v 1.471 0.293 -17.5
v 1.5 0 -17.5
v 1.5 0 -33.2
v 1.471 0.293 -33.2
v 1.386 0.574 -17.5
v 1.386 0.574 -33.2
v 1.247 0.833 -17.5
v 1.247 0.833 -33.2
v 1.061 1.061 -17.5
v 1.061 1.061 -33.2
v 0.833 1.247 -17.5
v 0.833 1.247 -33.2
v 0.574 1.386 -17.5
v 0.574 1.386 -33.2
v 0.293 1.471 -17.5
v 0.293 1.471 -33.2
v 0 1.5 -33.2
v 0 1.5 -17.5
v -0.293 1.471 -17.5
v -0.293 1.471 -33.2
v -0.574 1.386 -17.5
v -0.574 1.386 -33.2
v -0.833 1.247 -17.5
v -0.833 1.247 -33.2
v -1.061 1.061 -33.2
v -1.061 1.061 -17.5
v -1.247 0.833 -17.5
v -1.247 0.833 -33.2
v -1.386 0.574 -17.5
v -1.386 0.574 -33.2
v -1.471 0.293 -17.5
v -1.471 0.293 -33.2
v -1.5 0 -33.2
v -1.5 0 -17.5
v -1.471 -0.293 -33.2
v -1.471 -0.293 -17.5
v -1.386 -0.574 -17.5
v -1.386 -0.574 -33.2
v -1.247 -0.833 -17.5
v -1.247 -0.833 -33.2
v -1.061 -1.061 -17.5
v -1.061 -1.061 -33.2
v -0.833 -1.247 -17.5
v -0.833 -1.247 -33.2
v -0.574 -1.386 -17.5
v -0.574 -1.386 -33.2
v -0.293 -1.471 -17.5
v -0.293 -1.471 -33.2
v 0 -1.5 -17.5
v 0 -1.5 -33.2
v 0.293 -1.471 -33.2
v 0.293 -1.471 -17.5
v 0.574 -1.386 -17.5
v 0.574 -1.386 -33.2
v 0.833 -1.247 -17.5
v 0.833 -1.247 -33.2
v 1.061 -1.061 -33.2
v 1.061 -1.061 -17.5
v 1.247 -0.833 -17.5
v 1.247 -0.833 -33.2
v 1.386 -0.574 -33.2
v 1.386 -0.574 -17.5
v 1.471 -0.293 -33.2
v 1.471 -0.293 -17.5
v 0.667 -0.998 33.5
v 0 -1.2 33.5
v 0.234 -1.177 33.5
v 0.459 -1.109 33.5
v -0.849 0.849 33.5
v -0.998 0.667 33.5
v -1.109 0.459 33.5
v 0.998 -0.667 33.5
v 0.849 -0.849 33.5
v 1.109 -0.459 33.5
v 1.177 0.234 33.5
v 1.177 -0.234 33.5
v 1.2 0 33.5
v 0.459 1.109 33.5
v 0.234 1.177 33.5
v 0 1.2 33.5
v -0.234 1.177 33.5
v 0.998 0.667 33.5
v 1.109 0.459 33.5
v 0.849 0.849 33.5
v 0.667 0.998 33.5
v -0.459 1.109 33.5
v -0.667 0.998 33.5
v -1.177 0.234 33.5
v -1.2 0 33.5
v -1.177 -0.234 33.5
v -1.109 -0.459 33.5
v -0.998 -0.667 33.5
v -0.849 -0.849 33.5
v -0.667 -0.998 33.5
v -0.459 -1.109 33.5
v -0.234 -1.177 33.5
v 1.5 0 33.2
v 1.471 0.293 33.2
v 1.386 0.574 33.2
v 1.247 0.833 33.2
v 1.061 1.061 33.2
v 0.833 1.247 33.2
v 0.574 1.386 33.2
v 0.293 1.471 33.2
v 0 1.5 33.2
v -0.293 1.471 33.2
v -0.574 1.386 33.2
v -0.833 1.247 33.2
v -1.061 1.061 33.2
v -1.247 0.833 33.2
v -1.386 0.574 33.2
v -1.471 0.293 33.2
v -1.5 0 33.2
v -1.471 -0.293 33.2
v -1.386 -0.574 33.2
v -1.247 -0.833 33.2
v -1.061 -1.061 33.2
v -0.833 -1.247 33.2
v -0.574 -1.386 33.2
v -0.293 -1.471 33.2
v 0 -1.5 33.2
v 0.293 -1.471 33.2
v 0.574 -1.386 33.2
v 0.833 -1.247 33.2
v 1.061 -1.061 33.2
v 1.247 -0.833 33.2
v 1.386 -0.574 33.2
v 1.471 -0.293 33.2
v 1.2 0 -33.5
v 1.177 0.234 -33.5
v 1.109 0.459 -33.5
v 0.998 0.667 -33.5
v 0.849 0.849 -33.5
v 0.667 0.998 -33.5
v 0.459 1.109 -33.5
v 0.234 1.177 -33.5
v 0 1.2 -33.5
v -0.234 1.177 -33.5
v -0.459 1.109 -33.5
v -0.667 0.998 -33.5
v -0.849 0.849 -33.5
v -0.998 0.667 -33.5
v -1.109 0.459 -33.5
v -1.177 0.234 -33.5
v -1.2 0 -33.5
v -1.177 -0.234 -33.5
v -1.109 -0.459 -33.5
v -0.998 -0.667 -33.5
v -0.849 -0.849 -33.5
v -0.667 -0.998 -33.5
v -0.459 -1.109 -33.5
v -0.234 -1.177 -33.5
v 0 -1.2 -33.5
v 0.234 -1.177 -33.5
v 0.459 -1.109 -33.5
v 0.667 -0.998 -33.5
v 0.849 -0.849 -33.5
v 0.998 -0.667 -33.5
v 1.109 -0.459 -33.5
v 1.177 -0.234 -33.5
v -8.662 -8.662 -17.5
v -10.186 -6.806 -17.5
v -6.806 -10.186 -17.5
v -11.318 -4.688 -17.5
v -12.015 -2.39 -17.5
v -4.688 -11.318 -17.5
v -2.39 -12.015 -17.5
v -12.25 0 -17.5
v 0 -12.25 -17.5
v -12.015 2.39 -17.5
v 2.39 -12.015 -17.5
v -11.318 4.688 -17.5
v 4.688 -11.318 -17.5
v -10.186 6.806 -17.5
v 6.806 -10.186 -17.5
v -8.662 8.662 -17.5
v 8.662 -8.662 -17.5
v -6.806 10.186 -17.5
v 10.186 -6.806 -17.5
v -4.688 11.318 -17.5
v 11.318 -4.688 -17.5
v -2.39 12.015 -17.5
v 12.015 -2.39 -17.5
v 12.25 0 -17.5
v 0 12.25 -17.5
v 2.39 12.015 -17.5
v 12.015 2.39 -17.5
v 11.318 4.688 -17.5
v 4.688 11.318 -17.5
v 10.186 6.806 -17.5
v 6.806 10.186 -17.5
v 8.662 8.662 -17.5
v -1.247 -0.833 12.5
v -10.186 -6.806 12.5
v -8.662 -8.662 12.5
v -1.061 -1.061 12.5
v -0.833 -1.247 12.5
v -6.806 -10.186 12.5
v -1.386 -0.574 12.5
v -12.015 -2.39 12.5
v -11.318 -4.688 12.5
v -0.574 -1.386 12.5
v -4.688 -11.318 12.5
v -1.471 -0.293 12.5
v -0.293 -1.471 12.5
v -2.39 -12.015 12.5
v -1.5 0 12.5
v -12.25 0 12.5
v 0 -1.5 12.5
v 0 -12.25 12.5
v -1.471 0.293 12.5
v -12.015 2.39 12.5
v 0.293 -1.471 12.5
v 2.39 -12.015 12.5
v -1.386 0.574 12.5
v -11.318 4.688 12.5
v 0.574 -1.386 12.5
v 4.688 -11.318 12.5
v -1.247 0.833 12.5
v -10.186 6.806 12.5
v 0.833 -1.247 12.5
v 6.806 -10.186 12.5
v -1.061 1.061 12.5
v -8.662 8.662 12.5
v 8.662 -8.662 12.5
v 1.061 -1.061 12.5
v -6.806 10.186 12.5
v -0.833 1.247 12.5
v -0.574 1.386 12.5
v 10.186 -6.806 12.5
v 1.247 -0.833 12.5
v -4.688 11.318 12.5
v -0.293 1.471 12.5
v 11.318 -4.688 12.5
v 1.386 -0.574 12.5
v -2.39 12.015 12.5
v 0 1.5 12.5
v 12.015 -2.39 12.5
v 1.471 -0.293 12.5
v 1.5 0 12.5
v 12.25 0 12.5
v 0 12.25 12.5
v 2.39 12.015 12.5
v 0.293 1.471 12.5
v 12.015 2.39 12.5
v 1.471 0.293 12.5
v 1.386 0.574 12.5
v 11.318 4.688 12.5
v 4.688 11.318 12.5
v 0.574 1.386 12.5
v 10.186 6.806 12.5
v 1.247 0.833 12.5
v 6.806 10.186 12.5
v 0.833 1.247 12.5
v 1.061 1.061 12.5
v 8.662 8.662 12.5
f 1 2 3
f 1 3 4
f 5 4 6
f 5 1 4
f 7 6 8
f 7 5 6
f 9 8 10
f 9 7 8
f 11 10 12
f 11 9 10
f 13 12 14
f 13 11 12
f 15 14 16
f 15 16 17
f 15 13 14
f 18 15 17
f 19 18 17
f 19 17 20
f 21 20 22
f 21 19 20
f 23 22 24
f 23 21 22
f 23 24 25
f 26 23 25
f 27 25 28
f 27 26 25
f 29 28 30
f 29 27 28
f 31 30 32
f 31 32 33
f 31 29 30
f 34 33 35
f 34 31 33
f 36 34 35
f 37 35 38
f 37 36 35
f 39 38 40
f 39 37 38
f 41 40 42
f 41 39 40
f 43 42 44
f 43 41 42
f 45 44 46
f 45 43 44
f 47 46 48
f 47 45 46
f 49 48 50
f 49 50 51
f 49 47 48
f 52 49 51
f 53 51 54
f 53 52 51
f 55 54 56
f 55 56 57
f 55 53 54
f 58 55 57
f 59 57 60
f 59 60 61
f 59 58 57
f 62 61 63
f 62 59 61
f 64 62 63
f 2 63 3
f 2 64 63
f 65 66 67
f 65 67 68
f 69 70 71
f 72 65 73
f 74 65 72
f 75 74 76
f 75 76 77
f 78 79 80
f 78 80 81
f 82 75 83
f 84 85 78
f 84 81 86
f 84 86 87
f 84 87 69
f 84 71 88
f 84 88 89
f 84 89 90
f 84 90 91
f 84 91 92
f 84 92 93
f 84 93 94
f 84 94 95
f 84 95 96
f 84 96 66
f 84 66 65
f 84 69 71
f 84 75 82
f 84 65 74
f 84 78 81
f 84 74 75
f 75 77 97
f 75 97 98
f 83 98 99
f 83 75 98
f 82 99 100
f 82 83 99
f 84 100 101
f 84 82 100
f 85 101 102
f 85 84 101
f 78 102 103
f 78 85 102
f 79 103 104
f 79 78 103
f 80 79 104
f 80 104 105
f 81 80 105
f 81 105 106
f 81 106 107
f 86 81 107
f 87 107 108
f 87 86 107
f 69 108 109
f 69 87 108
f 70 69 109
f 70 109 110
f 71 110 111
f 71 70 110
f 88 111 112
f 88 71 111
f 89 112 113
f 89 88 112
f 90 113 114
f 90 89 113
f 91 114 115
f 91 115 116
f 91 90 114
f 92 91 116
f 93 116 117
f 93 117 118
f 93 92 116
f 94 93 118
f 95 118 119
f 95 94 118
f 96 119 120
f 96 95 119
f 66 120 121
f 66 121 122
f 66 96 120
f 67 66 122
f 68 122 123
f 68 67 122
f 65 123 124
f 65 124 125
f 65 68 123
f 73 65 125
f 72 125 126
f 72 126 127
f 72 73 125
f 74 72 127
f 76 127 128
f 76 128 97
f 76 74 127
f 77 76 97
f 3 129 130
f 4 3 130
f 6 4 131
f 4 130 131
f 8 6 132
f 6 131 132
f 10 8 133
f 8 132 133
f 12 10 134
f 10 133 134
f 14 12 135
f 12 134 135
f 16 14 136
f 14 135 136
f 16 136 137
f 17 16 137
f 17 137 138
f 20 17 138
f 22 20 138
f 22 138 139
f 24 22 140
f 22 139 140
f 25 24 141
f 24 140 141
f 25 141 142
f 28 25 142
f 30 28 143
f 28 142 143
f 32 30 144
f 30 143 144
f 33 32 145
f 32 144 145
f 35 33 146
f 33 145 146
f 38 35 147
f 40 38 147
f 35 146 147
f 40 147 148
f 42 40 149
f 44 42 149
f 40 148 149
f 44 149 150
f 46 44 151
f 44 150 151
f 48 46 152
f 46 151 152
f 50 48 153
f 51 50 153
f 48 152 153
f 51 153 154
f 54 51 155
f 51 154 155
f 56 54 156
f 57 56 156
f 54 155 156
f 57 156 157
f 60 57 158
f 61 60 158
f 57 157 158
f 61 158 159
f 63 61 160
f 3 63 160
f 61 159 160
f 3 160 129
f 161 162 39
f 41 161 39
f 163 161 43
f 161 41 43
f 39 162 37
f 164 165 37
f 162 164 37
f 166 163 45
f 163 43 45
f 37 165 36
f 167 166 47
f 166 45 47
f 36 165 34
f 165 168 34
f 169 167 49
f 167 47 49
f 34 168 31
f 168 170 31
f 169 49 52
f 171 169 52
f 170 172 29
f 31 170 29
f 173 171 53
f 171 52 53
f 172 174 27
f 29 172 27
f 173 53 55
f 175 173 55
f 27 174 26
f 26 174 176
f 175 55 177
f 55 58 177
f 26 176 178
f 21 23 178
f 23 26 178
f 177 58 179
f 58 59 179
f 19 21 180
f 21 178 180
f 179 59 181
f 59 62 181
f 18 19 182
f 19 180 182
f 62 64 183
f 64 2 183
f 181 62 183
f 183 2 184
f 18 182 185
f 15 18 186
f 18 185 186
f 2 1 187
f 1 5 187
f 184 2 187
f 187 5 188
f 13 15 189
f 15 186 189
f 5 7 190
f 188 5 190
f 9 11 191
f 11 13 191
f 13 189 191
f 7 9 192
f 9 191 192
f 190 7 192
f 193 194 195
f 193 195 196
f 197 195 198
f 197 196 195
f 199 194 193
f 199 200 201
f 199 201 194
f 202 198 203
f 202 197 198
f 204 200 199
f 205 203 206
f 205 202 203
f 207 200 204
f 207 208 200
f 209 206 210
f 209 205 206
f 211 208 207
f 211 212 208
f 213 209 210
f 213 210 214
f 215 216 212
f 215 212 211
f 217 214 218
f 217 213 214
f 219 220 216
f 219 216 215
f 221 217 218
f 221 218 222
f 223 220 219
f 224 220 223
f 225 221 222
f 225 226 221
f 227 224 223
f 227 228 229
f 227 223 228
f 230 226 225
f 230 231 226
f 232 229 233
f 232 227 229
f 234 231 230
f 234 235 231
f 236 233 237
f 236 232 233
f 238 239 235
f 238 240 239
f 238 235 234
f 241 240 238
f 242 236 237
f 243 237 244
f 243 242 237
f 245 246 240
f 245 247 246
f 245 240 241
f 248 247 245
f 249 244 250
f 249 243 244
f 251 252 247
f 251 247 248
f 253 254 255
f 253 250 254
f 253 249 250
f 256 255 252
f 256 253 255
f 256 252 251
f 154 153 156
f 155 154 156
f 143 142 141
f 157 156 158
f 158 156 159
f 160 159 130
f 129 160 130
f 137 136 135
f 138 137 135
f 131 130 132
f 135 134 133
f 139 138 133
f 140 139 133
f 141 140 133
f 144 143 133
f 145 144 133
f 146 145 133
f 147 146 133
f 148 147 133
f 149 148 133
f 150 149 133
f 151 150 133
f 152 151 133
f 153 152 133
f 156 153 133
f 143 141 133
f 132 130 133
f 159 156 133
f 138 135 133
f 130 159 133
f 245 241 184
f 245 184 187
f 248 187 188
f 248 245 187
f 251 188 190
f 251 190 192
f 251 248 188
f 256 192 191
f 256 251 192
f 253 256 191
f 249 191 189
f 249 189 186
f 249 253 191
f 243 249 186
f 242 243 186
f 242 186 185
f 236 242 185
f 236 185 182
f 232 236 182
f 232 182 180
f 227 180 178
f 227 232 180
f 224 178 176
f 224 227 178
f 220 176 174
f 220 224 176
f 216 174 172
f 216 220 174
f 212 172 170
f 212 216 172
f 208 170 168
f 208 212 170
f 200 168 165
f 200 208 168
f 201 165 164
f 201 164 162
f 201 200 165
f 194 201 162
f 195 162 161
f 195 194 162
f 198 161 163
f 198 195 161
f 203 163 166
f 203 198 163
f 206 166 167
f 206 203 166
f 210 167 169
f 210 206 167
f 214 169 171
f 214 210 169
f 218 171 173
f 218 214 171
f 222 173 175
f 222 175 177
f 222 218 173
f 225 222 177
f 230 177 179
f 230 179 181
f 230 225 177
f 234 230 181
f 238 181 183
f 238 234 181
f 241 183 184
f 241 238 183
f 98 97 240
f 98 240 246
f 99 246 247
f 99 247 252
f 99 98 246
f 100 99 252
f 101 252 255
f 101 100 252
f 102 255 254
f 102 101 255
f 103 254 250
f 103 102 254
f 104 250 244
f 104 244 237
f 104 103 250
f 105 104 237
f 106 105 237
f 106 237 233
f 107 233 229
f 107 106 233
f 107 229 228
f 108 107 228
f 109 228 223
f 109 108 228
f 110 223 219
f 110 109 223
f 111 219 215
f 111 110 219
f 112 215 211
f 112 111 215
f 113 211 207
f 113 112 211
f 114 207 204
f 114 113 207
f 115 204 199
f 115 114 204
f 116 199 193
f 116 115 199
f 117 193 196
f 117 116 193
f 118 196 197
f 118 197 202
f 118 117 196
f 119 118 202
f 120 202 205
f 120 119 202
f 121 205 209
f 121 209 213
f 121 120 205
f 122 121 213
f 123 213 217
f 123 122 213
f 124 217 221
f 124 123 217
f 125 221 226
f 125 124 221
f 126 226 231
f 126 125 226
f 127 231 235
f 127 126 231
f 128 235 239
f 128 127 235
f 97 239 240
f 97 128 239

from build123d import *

# Parameters (mm, degrees)
SKETCH1_R           = 1.5
BOSS_EXTRUDE1_DEPTH = 33.5
SKETCH2_R           = 12.25
SKETCH2_R_2         = 1.5
BOSS_EXTRUDE2_DEPTH = 30
CHAMFER1_SIZE       = 0.3


with BuildPart() as part:
    # Sketch1 → Boss-Extrude1 (new body, symmetric)
    with BuildSketch(Plane.XY):
        Circle(SKETCH1_R)
    extrude(amount=BOSS_EXTRUDE1_DEPTH, both=True)

    # Sketch2 → Boss-Extrude2 (add)
    with BuildSketch(Plane.XY.offset(12.5)):
        Circle(SKETCH2_R)
        Circle(SKETCH2_R_2, mode=Mode.SUBTRACT)
    extrude(amount=-BOSS_EXTRUDE2_DEPTH)

    # Chamfer1
    chamfer1_edges = [part.edges().sort_by_distance(p)[0] for p in [
        (-1.5, 0, -33.5),
        (-1.5, 0, 33.5),
    ]]
    chamfer(chamfer1_edges, length=CHAMFER1_SIZE)


solid = part.part
